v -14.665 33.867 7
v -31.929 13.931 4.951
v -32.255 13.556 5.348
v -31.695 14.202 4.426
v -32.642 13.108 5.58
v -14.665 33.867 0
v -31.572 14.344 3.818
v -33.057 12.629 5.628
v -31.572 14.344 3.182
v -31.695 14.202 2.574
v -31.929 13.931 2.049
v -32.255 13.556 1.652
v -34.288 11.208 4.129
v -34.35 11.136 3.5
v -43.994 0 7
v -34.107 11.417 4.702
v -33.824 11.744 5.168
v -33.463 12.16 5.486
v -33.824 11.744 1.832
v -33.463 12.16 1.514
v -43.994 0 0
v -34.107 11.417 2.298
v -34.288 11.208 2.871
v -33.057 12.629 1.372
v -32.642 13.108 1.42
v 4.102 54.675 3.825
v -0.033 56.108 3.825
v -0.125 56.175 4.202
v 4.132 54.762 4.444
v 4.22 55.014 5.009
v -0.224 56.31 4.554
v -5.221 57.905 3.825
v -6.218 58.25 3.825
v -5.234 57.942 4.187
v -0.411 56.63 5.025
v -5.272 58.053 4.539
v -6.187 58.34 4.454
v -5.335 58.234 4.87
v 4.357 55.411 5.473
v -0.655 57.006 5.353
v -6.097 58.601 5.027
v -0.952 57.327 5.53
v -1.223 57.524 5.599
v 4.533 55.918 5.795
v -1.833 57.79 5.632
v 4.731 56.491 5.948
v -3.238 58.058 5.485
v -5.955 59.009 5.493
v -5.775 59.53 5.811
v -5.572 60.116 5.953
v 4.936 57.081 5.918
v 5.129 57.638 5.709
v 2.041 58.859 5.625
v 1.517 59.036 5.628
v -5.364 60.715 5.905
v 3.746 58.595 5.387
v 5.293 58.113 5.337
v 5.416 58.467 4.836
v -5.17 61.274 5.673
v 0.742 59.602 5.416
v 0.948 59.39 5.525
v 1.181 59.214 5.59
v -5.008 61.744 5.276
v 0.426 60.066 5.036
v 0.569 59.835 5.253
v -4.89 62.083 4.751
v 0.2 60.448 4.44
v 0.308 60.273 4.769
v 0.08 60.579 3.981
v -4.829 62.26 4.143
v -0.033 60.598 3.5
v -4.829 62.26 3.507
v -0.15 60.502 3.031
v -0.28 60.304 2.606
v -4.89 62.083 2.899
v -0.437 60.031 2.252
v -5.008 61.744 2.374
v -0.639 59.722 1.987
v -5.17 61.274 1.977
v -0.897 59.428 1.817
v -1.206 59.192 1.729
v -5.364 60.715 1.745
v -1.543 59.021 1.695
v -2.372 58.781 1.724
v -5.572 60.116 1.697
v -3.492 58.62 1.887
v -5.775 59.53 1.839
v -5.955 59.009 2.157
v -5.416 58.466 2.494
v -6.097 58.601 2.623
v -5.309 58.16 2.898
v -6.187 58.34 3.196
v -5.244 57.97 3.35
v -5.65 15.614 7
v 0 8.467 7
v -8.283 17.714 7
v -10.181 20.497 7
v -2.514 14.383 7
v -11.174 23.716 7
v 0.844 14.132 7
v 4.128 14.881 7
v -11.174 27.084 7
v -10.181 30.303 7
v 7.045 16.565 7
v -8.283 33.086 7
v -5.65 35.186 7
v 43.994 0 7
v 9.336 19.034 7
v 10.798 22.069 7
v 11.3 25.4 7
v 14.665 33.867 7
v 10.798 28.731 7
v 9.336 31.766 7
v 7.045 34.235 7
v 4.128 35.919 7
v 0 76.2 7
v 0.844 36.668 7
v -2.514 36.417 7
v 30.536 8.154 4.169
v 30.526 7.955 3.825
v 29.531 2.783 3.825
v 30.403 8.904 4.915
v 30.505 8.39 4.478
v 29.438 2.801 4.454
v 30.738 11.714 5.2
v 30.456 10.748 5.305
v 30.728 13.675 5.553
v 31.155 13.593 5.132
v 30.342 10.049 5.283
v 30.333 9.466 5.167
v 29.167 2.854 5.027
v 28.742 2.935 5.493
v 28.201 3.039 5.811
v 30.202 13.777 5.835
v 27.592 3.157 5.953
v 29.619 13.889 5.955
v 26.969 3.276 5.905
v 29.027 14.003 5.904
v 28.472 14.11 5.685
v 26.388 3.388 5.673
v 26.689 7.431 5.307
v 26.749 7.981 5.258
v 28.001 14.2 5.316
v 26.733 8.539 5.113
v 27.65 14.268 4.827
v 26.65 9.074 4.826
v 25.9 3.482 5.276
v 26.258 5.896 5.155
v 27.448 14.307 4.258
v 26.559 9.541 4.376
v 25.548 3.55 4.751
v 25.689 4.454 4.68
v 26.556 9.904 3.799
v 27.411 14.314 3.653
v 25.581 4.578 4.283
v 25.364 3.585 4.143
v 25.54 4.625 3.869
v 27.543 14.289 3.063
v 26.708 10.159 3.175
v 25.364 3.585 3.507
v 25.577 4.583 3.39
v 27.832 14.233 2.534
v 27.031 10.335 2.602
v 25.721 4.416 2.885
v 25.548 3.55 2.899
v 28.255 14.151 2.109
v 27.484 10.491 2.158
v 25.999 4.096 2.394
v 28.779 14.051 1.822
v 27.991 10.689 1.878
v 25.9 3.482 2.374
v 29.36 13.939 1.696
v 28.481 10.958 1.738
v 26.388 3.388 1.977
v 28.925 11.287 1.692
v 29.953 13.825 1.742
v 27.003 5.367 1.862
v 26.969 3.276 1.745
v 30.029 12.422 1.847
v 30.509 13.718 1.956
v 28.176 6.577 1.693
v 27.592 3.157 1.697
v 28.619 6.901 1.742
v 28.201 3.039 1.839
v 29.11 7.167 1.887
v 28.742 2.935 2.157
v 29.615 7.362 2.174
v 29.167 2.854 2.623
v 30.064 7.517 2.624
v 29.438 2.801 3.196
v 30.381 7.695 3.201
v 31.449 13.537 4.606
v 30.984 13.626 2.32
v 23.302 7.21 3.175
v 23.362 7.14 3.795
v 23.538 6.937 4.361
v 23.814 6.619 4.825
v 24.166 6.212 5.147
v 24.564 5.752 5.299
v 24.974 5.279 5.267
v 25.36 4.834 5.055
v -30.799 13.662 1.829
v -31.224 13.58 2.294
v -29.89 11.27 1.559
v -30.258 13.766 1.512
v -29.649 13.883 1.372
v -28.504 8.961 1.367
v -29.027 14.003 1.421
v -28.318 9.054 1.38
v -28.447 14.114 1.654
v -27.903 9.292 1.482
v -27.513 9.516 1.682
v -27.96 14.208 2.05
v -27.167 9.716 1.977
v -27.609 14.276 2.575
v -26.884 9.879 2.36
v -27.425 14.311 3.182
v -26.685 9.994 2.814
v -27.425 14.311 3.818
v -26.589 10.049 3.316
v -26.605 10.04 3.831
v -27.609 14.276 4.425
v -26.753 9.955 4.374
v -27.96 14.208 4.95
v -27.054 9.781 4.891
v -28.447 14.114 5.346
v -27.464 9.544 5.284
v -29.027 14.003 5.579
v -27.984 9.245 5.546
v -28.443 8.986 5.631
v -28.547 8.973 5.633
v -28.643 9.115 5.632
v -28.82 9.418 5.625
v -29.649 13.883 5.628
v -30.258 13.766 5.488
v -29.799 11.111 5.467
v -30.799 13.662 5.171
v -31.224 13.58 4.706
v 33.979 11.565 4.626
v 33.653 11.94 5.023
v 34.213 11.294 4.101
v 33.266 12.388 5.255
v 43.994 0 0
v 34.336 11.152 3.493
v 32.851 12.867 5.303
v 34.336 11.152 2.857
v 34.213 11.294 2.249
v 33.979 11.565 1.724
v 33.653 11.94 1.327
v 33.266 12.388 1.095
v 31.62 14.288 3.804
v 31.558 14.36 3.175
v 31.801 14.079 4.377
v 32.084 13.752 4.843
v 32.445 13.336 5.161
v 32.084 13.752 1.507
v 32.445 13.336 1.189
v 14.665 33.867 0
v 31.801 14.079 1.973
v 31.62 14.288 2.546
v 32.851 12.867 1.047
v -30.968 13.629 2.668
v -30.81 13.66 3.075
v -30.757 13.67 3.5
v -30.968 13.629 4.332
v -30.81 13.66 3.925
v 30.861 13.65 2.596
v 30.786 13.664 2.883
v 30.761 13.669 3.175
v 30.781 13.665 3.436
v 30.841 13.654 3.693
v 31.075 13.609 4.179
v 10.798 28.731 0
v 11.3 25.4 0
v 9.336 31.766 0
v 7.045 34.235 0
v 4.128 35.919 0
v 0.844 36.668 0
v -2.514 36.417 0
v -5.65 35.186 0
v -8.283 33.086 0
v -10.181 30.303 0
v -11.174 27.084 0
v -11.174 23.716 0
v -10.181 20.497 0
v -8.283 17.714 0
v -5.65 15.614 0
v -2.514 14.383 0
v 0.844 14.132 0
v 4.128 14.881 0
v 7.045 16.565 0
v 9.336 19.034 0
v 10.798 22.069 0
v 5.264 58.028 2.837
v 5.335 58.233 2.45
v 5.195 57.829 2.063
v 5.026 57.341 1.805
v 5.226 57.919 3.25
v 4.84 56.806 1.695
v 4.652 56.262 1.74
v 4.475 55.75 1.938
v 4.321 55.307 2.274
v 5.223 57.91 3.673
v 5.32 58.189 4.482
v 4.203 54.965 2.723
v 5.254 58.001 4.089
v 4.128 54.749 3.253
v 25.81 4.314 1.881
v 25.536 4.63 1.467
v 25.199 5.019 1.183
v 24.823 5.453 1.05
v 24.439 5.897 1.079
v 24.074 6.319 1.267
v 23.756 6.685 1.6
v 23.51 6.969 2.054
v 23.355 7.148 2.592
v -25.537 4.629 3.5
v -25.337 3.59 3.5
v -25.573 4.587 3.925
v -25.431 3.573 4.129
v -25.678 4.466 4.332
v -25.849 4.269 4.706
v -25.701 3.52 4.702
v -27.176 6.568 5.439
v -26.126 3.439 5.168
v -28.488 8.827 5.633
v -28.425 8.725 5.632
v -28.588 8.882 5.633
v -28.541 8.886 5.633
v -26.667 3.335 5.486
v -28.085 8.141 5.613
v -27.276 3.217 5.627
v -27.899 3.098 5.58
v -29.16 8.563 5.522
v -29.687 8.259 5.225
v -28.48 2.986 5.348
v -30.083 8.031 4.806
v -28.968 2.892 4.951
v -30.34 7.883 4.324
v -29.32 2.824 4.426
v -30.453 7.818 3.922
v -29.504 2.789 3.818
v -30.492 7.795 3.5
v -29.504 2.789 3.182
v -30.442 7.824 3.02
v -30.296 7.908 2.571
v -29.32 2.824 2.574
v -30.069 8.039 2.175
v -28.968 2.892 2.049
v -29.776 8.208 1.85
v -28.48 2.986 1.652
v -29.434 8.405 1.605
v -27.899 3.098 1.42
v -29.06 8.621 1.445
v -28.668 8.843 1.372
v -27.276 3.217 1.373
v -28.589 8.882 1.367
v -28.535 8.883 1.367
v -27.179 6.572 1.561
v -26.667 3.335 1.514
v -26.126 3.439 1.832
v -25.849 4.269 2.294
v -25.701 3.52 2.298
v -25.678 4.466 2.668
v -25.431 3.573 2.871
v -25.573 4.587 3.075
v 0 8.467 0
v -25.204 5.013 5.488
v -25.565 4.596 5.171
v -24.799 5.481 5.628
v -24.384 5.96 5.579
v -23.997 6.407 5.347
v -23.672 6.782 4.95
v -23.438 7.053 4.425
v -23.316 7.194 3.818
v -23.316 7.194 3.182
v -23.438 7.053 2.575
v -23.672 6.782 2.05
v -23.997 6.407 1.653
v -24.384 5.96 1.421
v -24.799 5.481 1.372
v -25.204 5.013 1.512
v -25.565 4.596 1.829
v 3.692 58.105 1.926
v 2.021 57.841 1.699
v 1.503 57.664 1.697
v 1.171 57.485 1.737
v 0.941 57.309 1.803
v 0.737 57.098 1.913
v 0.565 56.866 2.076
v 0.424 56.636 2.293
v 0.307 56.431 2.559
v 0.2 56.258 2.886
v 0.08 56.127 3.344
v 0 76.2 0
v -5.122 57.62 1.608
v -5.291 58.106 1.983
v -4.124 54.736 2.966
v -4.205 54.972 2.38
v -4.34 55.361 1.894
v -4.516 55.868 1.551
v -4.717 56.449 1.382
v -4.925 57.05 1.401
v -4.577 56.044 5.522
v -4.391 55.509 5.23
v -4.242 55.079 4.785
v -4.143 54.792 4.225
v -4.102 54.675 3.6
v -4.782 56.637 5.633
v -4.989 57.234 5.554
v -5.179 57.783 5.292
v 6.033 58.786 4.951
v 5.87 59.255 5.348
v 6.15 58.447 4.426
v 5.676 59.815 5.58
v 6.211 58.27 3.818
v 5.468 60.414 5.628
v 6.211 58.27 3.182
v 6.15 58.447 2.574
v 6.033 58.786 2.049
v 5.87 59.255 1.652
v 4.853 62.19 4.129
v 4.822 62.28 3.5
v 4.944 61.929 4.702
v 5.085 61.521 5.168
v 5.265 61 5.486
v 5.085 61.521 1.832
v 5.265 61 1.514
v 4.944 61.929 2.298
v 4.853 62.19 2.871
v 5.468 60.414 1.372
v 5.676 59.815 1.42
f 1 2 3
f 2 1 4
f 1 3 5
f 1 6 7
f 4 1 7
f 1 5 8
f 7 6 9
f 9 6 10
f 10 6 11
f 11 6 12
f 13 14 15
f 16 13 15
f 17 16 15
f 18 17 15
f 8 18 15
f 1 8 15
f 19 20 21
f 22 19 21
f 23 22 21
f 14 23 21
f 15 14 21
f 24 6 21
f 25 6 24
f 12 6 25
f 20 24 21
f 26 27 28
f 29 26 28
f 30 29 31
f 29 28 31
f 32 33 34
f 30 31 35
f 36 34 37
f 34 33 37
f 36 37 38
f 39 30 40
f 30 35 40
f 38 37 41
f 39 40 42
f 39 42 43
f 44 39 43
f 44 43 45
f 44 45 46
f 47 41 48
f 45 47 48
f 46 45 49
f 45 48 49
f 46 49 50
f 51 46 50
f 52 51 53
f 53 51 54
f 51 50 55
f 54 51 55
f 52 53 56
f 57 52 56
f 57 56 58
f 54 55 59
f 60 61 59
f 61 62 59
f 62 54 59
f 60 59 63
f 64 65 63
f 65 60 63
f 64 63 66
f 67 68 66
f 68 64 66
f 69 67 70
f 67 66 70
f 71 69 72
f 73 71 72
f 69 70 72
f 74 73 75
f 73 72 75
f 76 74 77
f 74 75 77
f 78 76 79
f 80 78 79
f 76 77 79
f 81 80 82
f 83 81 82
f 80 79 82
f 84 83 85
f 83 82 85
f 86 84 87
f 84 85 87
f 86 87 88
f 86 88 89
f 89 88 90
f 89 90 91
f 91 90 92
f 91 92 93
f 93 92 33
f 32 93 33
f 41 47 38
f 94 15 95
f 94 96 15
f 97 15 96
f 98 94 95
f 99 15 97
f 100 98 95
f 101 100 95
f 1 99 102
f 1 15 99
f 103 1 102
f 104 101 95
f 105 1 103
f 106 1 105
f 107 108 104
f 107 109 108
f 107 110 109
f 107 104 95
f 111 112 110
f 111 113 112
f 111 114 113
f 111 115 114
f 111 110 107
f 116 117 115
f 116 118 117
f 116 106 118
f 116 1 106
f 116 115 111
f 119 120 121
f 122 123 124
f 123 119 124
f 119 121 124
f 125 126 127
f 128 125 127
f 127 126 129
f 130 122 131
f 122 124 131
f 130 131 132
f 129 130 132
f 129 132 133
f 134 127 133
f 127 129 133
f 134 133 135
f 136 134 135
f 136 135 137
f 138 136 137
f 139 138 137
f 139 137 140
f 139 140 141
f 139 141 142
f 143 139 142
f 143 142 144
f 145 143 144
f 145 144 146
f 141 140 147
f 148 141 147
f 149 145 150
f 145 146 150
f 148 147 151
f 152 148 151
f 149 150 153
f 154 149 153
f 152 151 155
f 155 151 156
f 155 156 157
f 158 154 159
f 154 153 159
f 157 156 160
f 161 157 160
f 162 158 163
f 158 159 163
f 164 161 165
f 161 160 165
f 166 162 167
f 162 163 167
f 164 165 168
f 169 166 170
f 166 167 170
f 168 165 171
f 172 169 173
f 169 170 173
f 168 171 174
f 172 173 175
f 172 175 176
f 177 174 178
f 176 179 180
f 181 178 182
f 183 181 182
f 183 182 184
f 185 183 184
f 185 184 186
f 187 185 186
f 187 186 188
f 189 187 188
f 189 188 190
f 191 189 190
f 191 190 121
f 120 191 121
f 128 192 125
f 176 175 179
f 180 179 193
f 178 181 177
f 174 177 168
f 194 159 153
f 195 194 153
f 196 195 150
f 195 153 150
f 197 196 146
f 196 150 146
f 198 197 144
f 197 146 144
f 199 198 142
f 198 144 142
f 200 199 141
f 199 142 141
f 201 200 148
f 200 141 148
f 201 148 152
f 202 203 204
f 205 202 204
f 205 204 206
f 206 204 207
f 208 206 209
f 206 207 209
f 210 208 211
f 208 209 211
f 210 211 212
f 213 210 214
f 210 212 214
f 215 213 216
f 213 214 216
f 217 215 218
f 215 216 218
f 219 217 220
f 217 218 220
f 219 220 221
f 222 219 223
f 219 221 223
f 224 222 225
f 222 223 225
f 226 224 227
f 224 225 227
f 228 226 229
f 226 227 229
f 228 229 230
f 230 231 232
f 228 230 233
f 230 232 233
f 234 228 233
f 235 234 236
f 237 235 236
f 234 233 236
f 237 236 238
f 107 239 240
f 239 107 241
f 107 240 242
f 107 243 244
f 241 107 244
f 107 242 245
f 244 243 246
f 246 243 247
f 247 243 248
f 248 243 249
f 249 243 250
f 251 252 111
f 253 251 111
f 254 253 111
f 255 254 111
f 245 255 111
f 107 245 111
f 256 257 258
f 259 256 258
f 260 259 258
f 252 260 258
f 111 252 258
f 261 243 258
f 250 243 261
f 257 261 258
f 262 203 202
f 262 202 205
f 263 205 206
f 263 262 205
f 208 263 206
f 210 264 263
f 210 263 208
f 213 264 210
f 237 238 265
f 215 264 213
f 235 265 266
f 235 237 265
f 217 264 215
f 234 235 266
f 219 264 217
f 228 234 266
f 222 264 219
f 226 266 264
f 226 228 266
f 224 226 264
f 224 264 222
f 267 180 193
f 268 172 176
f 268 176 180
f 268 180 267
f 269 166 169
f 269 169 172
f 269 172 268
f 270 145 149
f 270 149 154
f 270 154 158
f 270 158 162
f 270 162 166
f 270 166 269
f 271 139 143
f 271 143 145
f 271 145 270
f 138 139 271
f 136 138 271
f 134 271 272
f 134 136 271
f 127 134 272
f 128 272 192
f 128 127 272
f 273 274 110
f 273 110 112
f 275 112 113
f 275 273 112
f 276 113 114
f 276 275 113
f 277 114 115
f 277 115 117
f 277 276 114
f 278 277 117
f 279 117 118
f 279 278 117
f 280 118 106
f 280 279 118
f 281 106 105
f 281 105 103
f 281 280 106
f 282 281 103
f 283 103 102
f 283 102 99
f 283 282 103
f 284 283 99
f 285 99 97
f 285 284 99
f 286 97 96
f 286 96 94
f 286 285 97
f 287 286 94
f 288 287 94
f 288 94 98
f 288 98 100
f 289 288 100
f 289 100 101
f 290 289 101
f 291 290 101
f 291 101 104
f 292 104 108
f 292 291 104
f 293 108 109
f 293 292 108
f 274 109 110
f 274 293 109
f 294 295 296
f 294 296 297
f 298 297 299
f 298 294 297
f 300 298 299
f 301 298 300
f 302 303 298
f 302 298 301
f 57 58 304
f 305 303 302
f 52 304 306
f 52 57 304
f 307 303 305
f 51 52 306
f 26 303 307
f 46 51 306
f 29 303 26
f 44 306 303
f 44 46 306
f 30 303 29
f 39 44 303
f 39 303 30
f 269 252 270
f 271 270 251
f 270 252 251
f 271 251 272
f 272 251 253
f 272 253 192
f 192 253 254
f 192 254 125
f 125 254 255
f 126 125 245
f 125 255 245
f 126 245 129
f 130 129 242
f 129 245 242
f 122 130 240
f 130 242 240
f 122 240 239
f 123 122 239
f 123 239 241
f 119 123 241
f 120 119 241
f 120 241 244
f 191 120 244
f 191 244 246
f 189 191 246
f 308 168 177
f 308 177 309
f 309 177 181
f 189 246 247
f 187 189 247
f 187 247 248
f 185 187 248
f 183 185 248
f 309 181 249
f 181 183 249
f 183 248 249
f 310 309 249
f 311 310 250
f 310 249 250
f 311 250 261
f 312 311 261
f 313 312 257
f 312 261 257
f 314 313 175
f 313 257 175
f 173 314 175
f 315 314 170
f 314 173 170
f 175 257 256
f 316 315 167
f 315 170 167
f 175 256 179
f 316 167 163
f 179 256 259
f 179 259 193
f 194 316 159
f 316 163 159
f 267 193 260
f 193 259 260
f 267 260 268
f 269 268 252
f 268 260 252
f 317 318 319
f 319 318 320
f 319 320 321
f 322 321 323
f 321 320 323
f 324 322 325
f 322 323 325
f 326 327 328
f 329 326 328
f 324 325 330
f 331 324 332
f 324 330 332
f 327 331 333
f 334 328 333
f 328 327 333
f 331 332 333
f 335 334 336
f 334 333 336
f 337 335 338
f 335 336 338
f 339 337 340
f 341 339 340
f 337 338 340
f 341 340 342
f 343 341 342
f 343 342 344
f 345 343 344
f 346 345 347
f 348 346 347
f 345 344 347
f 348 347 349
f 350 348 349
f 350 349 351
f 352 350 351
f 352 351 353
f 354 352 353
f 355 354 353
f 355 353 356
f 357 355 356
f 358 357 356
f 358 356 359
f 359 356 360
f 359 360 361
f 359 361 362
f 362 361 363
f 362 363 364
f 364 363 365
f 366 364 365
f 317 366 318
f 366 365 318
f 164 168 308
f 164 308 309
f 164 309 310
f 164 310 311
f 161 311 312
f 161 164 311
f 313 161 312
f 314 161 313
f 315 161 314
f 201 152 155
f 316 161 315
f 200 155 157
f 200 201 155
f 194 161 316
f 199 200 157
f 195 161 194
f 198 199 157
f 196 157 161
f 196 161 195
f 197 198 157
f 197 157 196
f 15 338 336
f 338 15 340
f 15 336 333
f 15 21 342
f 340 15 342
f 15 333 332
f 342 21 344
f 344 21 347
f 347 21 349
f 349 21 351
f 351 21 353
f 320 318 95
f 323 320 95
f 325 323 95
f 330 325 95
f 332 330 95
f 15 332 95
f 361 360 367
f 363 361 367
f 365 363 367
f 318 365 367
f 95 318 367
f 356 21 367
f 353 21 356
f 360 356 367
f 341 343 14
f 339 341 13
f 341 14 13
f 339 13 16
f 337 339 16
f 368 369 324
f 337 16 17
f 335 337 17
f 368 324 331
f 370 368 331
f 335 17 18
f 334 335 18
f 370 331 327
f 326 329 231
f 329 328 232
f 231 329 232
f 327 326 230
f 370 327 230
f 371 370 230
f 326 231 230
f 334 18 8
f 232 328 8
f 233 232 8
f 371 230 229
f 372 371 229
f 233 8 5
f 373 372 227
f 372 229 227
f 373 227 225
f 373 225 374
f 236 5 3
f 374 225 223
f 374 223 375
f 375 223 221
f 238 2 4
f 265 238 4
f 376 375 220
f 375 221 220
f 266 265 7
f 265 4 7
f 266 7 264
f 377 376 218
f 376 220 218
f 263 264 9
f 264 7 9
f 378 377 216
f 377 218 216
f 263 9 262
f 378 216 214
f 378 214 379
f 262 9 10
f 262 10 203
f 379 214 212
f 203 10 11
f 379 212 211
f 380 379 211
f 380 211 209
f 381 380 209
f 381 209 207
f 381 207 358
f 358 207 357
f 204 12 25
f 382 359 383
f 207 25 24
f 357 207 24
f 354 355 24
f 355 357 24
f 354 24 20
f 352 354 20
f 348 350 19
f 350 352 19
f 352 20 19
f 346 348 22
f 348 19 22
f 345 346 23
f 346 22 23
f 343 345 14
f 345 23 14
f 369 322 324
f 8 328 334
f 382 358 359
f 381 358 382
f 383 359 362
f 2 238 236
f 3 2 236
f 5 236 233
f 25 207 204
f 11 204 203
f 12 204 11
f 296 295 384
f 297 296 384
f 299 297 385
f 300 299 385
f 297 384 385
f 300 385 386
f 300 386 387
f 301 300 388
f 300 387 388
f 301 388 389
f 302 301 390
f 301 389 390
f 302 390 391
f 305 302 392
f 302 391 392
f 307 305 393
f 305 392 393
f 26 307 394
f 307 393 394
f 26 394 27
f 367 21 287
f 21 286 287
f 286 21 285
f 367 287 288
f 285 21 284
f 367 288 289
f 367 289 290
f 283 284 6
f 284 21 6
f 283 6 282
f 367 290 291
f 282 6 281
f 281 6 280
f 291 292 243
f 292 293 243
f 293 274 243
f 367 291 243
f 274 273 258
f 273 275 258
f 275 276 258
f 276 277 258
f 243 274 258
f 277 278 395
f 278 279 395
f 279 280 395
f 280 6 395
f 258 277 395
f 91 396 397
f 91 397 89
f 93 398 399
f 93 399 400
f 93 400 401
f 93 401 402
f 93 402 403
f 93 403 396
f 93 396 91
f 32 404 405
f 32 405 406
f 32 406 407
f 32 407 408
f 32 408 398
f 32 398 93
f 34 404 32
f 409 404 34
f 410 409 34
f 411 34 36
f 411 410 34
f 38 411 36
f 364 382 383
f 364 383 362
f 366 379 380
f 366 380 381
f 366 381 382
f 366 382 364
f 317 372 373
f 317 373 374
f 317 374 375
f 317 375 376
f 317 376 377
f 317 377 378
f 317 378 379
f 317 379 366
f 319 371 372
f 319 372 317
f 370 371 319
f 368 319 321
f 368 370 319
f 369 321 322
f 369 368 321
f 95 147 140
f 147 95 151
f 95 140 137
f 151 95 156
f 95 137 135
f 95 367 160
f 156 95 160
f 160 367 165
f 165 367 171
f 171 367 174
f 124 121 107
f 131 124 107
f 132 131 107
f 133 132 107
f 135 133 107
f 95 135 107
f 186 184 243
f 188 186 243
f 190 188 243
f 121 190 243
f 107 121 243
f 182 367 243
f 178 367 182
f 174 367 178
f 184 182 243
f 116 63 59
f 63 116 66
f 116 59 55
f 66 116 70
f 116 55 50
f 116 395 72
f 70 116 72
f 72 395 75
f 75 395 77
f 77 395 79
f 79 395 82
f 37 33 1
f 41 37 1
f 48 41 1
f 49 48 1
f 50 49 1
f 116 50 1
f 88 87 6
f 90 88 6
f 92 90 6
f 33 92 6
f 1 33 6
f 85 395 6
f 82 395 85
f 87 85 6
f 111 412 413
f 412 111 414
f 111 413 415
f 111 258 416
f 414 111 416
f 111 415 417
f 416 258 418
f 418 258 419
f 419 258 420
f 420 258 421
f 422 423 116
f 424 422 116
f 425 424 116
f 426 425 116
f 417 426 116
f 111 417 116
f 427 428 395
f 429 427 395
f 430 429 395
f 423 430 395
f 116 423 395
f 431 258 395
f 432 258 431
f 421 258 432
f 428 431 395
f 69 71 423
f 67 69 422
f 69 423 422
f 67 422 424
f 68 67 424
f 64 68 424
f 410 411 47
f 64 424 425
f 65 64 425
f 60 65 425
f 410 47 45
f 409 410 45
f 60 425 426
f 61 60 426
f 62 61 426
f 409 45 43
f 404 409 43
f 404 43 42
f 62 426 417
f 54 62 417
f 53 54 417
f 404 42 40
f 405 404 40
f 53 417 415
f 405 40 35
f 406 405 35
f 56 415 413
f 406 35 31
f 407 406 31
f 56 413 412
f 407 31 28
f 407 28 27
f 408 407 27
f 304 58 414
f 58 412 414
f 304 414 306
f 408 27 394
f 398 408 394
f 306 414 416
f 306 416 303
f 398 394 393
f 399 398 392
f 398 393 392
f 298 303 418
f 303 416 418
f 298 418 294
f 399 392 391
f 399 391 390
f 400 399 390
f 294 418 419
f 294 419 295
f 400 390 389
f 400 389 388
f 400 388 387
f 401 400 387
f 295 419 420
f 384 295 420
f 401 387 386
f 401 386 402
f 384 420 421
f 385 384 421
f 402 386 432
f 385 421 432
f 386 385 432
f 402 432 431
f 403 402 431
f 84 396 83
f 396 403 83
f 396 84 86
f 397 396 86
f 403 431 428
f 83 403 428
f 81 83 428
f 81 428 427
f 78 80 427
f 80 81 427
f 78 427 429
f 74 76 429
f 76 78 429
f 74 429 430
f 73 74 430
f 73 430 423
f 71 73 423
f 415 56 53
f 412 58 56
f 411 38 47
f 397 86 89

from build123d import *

# Parameters (mm, degrees)
F0_R          = 11.2999999997
F1_DEPTH      = 7.0000000005
F2_R          = 2.1333927031
F3_DEPTH      = 10.922
F3_DEPTH_BACK = 25.4
F4_R          = 2.1336
F5_DEPTH      = 10.922
F6_R          = 2.1336
F7_DEPTH      = 10.922
F8_R          = 2.1336
F9_DEPTH      = 10.922
F10_R         = 2.1336
F11_DEPTH     = 10.922
F12_R         = 2.1336
F13_DEPTH     = 10.922


with BuildPart() as f1:
    # F0 (on Top) → F1 (new body)
    with BuildSketch(Plane.XY):
        Polygon((14.6646968374, 33.8666666667), (0, 76.2), (-14.6646968374, 33.8666666667), (-43.9940905122, 0), (0, 8.4666666667), (43.9940905122, 0), align=None)
        with Locations((0, 25.4)):
            Circle(F0_R, mode=Mode.SUBTRACT)
    extrude(amount=F1_DEPTH)

    # F2 (on face) → F3 (cut, two sides)
    with BuildSketch(Plane(origin=(-1.5712175183, 8.1642857143, 0), x_dir=(0.9819805061, 0.1889822365, 0), z_dir=(0.1889822365, -0.9819805061, 0))) as f3_sk:
        with Locations((-26.335739265, 3.5000000002)):
            Circle(F2_R)
    extrude(amount=-F3_DEPTH, mode=Mode.SUBTRACT)
    extrude(f3_sk.sketch, amount=F3_DEPTH_BACK, mode=Mode.SUBTRACT)

    # F4 (on face) → F5 (cut)
    with BuildSketch(Plane(origin=(-25.1394802927, 21.7714285714, 0), x_dir=(-0.6546536707, -0.755928946, 0), z_dir=(-0.755928946, 0.6546536707, 0))):
        with Locations((11.9352928433, 3.5000000002)):
            Circle(F4_R)
    extrude(amount=-F5_DEPTH, mode=Mode.SUBTRACT)

    # F6 (on face) → F7 (cut)
    with BuildSketch(Plane(origin=(23.5682627744, 8.1642857143, 0), x_dir=(-0.3273268354, 0.9449111825, 0), z_dir=(0.9449111825, 0.3273268354, 0))):
        with Locations((55.1366321083, 3.5000000002)):
            Circle(F6_R)
    extrude(amount=-F7_DEPTH, mode=Mode.SUBTRACT)

    # F8 (on face) → F9 (cut)
    with BuildSketch(Plane(origin=(-23.5682627744, 8.1642857143, 0), x_dir=(-0.3273268354, -0.9449111825, 0), z_dir=(-0.9449111825, 0.3273268354, 0))):
        with Locations((-55.1397637729, 3.8250000005)):
            Circle(F8_R)
    extrude(amount=-F9_DEPTH, mode=Mode.SUBTRACT)

    # F10 (on face) → F11 (cut)
    with BuildSketch(Plane(origin=(25.1394802927, 21.7714285714, 0), x_dir=(-0.6546536707, 0.755928946, 0), z_dir=(0.755928946, 0.6546536707, 0))):
        with Locations((-11.938424508, 3.175)):
            Circle(F10_R)
    extrude(amount=-F11_DEPTH, mode=Mode.SUBTRACT)

    # F12 (on face) → F13 (cut)
    with BuildSketch(Plane(origin=(1.5712175183, 8.1642857143, 0), x_dir=(0.9819805061, -0.1889822365, 0), z_dir=(-0.1889822365, -0.9819805061, 0))):
        with Locations((26.3388709296, 3.8250000005)):
            Circle(F12_R)
    extrude(amount=-F13_DEPTH, mode=Mode.SUBTRACT)


solid = f1.part
